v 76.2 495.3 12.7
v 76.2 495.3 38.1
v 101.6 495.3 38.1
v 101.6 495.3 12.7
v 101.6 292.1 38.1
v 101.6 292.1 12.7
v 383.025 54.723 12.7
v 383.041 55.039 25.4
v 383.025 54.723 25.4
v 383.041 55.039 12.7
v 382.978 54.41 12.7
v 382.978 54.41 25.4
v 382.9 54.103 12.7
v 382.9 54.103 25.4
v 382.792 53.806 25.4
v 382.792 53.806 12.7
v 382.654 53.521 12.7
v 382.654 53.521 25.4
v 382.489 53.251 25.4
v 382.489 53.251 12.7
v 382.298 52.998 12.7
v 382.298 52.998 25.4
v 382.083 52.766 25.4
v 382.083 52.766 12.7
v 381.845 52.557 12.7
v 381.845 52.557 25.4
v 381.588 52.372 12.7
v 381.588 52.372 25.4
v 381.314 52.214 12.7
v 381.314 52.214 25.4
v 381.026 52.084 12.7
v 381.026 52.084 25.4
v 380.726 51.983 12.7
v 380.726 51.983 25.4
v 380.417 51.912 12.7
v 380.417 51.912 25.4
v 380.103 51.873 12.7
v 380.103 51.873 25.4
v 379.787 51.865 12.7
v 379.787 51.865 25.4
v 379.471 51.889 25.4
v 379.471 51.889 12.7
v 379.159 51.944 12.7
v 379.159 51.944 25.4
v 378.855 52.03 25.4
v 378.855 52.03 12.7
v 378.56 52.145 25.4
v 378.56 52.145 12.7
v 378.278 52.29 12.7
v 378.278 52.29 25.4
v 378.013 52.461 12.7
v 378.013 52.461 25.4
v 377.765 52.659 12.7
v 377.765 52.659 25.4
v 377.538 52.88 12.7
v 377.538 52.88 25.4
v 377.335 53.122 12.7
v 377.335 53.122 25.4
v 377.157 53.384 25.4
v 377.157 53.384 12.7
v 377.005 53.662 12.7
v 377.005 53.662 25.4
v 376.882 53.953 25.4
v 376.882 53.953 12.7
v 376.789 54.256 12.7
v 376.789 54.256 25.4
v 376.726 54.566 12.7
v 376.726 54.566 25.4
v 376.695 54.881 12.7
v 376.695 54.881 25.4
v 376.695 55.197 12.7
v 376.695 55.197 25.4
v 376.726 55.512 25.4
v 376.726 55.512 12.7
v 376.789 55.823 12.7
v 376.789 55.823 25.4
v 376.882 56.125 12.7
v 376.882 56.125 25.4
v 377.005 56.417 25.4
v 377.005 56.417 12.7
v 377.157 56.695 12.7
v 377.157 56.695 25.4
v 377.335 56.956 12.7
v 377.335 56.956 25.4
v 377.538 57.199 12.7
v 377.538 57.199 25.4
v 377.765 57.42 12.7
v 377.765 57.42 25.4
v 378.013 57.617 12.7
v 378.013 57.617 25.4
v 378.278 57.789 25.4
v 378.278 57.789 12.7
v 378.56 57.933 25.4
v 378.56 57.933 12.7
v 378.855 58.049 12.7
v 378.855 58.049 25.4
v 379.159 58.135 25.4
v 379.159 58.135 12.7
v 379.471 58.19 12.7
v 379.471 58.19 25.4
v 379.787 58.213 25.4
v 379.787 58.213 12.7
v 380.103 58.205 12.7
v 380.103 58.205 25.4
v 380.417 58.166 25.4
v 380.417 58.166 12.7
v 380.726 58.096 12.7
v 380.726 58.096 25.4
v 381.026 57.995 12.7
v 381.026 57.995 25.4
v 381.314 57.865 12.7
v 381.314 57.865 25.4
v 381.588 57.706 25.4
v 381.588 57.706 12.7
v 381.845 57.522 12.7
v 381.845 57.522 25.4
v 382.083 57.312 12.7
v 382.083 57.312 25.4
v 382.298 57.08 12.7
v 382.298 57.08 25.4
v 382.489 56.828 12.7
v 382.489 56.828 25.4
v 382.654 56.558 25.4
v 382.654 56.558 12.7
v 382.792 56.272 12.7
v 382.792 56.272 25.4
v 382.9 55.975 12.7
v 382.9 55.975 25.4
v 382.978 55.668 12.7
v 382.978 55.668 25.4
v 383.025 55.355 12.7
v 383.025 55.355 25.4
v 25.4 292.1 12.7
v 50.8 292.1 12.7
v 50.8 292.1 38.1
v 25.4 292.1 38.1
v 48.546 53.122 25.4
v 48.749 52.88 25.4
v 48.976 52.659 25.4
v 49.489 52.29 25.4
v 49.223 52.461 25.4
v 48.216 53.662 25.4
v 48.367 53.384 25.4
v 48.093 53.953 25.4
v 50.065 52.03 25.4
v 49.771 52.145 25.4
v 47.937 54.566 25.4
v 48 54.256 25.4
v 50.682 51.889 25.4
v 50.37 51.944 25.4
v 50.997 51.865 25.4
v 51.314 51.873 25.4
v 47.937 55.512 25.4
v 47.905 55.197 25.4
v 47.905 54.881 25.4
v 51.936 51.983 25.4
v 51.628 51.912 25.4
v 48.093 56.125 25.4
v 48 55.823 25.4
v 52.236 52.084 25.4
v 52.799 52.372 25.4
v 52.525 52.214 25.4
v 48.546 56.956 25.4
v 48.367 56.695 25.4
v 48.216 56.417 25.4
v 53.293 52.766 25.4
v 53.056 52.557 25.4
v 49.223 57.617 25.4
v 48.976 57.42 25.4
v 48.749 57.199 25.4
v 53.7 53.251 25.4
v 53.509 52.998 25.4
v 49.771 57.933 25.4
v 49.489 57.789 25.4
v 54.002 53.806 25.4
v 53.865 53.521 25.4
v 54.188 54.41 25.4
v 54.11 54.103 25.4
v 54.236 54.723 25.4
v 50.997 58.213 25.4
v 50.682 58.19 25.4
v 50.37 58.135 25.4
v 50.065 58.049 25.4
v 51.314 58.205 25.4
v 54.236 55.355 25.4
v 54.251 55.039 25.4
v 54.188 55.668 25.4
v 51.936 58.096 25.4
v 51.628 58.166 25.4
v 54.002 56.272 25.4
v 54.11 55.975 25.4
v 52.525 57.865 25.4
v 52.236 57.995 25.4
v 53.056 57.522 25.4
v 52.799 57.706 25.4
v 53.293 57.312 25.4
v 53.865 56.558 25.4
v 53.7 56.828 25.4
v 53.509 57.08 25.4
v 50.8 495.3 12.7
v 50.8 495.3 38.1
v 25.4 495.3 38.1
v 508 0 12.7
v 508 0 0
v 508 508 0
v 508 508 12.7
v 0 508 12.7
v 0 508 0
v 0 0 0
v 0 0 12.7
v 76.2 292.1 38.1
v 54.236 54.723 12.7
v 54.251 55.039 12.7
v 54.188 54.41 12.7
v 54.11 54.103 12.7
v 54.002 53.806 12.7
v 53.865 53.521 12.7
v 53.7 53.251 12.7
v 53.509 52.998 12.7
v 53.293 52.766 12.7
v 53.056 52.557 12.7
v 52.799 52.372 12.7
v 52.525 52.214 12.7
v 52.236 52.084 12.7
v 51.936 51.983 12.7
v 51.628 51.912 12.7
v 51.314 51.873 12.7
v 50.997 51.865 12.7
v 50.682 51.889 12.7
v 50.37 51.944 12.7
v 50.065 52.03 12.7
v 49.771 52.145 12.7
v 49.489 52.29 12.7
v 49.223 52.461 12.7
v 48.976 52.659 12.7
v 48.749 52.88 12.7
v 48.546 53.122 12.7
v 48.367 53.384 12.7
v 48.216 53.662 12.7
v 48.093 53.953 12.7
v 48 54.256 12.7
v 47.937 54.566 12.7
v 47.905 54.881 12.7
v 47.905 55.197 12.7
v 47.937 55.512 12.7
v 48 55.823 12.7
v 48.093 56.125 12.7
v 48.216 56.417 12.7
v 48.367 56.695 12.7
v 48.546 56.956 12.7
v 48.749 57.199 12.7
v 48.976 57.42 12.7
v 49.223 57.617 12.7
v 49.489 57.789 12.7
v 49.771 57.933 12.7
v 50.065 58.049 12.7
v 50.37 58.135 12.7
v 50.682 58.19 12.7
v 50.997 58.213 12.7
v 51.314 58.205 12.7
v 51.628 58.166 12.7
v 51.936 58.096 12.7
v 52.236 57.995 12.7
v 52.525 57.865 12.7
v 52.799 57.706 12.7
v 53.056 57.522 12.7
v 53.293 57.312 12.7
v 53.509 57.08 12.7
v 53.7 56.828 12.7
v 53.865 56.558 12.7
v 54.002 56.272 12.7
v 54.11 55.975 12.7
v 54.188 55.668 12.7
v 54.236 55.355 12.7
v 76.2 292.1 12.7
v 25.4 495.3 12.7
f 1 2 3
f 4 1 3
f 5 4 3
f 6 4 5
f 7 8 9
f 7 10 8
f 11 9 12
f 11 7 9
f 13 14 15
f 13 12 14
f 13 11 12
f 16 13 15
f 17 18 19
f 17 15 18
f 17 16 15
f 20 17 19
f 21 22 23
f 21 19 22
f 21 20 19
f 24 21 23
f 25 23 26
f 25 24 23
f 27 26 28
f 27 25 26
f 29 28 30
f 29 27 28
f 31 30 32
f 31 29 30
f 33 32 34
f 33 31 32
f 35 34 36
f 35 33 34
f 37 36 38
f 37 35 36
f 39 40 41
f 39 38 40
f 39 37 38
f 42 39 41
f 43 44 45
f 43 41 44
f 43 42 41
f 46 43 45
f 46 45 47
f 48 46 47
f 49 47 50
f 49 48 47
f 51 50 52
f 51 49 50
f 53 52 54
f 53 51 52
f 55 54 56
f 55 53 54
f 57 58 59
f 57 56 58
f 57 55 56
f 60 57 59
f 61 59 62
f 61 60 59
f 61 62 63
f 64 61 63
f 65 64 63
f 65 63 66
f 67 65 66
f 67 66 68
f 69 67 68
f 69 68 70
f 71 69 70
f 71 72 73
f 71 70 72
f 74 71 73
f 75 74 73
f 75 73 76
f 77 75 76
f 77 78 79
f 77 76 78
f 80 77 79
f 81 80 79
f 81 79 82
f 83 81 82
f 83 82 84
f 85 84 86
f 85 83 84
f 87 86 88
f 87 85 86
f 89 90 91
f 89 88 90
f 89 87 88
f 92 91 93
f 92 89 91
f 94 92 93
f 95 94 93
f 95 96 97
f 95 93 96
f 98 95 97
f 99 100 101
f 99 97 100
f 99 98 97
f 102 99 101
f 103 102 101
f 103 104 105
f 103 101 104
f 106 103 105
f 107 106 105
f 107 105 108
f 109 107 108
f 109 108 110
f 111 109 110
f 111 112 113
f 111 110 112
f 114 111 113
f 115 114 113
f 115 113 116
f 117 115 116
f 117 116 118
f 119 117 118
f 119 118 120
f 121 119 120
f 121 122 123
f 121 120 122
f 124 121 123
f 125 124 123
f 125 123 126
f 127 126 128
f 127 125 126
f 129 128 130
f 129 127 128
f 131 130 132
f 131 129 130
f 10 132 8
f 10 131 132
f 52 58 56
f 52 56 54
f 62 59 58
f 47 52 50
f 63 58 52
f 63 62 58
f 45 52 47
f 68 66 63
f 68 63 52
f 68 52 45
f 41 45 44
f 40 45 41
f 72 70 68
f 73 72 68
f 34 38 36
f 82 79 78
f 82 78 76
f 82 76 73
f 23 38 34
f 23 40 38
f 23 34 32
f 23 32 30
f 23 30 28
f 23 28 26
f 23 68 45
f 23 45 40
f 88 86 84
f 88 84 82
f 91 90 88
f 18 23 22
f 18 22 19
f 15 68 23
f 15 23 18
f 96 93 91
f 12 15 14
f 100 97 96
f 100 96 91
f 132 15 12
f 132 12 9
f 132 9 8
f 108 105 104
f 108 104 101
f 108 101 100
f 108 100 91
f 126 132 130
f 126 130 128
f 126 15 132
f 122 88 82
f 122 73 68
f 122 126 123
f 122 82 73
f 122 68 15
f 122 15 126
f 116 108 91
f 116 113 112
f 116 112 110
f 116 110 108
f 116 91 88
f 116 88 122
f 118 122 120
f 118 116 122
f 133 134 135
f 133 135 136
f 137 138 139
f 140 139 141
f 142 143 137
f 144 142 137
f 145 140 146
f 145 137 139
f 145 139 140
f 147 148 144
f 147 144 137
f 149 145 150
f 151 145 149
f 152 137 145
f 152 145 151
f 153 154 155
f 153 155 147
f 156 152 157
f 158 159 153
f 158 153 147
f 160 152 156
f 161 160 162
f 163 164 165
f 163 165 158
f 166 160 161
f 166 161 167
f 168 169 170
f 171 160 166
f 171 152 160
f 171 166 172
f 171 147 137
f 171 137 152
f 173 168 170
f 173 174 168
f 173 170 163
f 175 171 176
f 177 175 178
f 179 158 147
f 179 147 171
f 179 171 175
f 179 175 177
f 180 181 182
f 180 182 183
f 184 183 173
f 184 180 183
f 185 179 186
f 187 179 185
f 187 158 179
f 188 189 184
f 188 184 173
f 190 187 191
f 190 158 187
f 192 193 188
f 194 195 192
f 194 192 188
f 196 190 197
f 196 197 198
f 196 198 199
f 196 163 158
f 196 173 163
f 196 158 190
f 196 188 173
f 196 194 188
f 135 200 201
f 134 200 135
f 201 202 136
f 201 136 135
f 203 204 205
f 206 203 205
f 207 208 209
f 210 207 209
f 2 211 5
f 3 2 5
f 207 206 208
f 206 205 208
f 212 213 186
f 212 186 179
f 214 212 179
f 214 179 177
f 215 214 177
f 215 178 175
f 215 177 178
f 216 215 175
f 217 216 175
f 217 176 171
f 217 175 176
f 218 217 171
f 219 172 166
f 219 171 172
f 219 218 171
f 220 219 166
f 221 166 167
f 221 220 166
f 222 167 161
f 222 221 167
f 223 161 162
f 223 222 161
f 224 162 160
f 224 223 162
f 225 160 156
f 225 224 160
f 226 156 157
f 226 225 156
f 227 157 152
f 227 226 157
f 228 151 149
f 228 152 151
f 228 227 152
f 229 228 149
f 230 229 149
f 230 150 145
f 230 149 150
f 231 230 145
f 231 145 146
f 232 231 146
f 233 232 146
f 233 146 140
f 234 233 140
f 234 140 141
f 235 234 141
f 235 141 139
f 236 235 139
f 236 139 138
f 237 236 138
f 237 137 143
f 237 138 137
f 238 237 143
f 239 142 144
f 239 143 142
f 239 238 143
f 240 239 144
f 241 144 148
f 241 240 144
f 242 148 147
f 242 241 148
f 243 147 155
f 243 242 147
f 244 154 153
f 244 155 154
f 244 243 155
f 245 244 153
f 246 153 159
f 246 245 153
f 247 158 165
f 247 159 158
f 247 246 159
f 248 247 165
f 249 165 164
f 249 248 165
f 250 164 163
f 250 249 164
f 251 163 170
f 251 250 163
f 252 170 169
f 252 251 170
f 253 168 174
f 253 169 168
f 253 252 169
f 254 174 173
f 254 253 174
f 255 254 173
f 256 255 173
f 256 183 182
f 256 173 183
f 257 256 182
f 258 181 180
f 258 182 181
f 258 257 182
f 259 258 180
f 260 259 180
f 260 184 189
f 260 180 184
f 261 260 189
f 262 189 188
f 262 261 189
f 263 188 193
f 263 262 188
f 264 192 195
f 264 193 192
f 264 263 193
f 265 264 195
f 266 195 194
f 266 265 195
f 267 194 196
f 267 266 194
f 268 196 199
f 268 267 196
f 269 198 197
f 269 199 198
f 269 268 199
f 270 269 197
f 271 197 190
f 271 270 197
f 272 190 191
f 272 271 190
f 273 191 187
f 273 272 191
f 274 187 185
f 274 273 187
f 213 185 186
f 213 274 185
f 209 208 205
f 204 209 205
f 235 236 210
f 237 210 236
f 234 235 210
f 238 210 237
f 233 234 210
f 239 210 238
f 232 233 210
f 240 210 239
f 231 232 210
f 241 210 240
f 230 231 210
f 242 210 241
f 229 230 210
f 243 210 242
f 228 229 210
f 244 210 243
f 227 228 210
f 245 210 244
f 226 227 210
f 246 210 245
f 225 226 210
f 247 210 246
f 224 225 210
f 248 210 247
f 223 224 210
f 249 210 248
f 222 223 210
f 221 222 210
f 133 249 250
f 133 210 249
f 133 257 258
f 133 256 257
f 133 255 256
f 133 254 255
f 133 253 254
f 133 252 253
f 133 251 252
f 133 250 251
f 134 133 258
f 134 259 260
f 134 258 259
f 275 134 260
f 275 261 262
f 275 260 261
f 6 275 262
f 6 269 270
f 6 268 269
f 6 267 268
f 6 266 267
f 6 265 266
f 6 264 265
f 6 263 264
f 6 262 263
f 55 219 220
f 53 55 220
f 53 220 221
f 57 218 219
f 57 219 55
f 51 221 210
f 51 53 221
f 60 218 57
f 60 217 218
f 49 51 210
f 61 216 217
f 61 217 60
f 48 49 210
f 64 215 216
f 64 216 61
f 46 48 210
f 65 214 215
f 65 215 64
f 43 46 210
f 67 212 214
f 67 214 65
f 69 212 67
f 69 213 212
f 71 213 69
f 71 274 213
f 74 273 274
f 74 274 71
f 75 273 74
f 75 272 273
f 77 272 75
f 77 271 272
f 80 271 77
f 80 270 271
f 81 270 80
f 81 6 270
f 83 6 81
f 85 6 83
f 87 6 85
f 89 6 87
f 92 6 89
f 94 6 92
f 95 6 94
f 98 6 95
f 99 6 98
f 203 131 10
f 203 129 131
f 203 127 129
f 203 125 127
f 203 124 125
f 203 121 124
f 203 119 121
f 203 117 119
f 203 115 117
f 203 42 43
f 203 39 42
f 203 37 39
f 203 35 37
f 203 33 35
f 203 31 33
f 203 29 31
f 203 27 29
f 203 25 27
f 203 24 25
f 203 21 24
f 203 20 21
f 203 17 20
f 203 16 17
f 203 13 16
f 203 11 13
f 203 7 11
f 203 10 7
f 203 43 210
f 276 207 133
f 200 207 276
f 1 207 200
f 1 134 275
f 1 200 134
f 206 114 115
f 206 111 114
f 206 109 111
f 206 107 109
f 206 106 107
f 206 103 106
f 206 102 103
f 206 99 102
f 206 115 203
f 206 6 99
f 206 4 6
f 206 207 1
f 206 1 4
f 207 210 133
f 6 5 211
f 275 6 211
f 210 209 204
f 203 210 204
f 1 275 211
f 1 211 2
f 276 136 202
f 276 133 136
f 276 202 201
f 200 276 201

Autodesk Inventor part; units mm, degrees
ref_plane "YZ Plane" through (0, 0, 0) normal (1, 0, 0) x (0, 1, 0)
ref_plane "XZ Plane" through (0, 0, 0) normal (0, 1, 0) x (-1, 0, 0)
ref_plane "XY Plane" through (0, 0, 0) normal (0, 0, 1) x (1, 0, 0)
sketch "Sketch1" plane through (0, 0, 0) normal (0, 0, 1) x (1, 0, 0)
  line L0 (0, 0) -> (508, 0)
  line L1 (508, 0) -> (508, 508)
  line L2 (508, 508) -> (0, 508)
  line L3 (0, 508) -> (0, 0)
  dimension "d0" = 508
  dimension "d1" = 508
extrude "Extrusion1" add sketch "Sketch1" along normal blind 12.7
sketch "Sketch2" plane through (0, 0, 12.7) normal (0, 0, 1) x (1, 0, 0)
  circle A0 centre (51.0764, 55.0392) radius 3.175
  circle A1 centre (379.8659, 55.0392) radius 3.175
  point P0 (0, 0)
  dimension "d4" = 6.35
  dimension "d5" = 6.35
extrude "Extrusion2" add sketch "Sketch2" along normal blind 12.7
sketch "Sketch3" plane through (0, 0, 12.7) normal (0, 0, 1) x (1, 0, 0)
  line L0 (25.4, 495.3) -> (50.8, 495.3)
  line L1 (50.8, 495.3) -> (50.8, 292.1)
  line L2 (50.8, 292.1) -> (25.4, 292.1)
  line L3 (25.4, 292.1) -> (25.4, 495.3)
  line L4 (76.2, 495.3) -> (101.6, 495.3)
  line L5 (101.6, 495.3) -> (101.6, 292.1)
  line L6 (101.6, 292.1) -> (76.2, 292.1)
  line L7 (76.2, 292.1) -> (76.2, 495.3)
  line L8 (508, 508) -> (0, 508) projected
  line L9 (0, 508) -> (0, 0) projected
  dimension "d8" = 25.4
  dimension "d9" = 203.2
  dimension "d10" = 25.4
  dimension "d11" = 203.2
  dimension "d12" = 25.4
  dimension "d15" = 12.7
  dimension "d16" = 12.7
  dimension "d17" = 50.8
extrude "Extrusion3" add sketch "Sketch3" along normal blind 25.4
properties part number "Base"
